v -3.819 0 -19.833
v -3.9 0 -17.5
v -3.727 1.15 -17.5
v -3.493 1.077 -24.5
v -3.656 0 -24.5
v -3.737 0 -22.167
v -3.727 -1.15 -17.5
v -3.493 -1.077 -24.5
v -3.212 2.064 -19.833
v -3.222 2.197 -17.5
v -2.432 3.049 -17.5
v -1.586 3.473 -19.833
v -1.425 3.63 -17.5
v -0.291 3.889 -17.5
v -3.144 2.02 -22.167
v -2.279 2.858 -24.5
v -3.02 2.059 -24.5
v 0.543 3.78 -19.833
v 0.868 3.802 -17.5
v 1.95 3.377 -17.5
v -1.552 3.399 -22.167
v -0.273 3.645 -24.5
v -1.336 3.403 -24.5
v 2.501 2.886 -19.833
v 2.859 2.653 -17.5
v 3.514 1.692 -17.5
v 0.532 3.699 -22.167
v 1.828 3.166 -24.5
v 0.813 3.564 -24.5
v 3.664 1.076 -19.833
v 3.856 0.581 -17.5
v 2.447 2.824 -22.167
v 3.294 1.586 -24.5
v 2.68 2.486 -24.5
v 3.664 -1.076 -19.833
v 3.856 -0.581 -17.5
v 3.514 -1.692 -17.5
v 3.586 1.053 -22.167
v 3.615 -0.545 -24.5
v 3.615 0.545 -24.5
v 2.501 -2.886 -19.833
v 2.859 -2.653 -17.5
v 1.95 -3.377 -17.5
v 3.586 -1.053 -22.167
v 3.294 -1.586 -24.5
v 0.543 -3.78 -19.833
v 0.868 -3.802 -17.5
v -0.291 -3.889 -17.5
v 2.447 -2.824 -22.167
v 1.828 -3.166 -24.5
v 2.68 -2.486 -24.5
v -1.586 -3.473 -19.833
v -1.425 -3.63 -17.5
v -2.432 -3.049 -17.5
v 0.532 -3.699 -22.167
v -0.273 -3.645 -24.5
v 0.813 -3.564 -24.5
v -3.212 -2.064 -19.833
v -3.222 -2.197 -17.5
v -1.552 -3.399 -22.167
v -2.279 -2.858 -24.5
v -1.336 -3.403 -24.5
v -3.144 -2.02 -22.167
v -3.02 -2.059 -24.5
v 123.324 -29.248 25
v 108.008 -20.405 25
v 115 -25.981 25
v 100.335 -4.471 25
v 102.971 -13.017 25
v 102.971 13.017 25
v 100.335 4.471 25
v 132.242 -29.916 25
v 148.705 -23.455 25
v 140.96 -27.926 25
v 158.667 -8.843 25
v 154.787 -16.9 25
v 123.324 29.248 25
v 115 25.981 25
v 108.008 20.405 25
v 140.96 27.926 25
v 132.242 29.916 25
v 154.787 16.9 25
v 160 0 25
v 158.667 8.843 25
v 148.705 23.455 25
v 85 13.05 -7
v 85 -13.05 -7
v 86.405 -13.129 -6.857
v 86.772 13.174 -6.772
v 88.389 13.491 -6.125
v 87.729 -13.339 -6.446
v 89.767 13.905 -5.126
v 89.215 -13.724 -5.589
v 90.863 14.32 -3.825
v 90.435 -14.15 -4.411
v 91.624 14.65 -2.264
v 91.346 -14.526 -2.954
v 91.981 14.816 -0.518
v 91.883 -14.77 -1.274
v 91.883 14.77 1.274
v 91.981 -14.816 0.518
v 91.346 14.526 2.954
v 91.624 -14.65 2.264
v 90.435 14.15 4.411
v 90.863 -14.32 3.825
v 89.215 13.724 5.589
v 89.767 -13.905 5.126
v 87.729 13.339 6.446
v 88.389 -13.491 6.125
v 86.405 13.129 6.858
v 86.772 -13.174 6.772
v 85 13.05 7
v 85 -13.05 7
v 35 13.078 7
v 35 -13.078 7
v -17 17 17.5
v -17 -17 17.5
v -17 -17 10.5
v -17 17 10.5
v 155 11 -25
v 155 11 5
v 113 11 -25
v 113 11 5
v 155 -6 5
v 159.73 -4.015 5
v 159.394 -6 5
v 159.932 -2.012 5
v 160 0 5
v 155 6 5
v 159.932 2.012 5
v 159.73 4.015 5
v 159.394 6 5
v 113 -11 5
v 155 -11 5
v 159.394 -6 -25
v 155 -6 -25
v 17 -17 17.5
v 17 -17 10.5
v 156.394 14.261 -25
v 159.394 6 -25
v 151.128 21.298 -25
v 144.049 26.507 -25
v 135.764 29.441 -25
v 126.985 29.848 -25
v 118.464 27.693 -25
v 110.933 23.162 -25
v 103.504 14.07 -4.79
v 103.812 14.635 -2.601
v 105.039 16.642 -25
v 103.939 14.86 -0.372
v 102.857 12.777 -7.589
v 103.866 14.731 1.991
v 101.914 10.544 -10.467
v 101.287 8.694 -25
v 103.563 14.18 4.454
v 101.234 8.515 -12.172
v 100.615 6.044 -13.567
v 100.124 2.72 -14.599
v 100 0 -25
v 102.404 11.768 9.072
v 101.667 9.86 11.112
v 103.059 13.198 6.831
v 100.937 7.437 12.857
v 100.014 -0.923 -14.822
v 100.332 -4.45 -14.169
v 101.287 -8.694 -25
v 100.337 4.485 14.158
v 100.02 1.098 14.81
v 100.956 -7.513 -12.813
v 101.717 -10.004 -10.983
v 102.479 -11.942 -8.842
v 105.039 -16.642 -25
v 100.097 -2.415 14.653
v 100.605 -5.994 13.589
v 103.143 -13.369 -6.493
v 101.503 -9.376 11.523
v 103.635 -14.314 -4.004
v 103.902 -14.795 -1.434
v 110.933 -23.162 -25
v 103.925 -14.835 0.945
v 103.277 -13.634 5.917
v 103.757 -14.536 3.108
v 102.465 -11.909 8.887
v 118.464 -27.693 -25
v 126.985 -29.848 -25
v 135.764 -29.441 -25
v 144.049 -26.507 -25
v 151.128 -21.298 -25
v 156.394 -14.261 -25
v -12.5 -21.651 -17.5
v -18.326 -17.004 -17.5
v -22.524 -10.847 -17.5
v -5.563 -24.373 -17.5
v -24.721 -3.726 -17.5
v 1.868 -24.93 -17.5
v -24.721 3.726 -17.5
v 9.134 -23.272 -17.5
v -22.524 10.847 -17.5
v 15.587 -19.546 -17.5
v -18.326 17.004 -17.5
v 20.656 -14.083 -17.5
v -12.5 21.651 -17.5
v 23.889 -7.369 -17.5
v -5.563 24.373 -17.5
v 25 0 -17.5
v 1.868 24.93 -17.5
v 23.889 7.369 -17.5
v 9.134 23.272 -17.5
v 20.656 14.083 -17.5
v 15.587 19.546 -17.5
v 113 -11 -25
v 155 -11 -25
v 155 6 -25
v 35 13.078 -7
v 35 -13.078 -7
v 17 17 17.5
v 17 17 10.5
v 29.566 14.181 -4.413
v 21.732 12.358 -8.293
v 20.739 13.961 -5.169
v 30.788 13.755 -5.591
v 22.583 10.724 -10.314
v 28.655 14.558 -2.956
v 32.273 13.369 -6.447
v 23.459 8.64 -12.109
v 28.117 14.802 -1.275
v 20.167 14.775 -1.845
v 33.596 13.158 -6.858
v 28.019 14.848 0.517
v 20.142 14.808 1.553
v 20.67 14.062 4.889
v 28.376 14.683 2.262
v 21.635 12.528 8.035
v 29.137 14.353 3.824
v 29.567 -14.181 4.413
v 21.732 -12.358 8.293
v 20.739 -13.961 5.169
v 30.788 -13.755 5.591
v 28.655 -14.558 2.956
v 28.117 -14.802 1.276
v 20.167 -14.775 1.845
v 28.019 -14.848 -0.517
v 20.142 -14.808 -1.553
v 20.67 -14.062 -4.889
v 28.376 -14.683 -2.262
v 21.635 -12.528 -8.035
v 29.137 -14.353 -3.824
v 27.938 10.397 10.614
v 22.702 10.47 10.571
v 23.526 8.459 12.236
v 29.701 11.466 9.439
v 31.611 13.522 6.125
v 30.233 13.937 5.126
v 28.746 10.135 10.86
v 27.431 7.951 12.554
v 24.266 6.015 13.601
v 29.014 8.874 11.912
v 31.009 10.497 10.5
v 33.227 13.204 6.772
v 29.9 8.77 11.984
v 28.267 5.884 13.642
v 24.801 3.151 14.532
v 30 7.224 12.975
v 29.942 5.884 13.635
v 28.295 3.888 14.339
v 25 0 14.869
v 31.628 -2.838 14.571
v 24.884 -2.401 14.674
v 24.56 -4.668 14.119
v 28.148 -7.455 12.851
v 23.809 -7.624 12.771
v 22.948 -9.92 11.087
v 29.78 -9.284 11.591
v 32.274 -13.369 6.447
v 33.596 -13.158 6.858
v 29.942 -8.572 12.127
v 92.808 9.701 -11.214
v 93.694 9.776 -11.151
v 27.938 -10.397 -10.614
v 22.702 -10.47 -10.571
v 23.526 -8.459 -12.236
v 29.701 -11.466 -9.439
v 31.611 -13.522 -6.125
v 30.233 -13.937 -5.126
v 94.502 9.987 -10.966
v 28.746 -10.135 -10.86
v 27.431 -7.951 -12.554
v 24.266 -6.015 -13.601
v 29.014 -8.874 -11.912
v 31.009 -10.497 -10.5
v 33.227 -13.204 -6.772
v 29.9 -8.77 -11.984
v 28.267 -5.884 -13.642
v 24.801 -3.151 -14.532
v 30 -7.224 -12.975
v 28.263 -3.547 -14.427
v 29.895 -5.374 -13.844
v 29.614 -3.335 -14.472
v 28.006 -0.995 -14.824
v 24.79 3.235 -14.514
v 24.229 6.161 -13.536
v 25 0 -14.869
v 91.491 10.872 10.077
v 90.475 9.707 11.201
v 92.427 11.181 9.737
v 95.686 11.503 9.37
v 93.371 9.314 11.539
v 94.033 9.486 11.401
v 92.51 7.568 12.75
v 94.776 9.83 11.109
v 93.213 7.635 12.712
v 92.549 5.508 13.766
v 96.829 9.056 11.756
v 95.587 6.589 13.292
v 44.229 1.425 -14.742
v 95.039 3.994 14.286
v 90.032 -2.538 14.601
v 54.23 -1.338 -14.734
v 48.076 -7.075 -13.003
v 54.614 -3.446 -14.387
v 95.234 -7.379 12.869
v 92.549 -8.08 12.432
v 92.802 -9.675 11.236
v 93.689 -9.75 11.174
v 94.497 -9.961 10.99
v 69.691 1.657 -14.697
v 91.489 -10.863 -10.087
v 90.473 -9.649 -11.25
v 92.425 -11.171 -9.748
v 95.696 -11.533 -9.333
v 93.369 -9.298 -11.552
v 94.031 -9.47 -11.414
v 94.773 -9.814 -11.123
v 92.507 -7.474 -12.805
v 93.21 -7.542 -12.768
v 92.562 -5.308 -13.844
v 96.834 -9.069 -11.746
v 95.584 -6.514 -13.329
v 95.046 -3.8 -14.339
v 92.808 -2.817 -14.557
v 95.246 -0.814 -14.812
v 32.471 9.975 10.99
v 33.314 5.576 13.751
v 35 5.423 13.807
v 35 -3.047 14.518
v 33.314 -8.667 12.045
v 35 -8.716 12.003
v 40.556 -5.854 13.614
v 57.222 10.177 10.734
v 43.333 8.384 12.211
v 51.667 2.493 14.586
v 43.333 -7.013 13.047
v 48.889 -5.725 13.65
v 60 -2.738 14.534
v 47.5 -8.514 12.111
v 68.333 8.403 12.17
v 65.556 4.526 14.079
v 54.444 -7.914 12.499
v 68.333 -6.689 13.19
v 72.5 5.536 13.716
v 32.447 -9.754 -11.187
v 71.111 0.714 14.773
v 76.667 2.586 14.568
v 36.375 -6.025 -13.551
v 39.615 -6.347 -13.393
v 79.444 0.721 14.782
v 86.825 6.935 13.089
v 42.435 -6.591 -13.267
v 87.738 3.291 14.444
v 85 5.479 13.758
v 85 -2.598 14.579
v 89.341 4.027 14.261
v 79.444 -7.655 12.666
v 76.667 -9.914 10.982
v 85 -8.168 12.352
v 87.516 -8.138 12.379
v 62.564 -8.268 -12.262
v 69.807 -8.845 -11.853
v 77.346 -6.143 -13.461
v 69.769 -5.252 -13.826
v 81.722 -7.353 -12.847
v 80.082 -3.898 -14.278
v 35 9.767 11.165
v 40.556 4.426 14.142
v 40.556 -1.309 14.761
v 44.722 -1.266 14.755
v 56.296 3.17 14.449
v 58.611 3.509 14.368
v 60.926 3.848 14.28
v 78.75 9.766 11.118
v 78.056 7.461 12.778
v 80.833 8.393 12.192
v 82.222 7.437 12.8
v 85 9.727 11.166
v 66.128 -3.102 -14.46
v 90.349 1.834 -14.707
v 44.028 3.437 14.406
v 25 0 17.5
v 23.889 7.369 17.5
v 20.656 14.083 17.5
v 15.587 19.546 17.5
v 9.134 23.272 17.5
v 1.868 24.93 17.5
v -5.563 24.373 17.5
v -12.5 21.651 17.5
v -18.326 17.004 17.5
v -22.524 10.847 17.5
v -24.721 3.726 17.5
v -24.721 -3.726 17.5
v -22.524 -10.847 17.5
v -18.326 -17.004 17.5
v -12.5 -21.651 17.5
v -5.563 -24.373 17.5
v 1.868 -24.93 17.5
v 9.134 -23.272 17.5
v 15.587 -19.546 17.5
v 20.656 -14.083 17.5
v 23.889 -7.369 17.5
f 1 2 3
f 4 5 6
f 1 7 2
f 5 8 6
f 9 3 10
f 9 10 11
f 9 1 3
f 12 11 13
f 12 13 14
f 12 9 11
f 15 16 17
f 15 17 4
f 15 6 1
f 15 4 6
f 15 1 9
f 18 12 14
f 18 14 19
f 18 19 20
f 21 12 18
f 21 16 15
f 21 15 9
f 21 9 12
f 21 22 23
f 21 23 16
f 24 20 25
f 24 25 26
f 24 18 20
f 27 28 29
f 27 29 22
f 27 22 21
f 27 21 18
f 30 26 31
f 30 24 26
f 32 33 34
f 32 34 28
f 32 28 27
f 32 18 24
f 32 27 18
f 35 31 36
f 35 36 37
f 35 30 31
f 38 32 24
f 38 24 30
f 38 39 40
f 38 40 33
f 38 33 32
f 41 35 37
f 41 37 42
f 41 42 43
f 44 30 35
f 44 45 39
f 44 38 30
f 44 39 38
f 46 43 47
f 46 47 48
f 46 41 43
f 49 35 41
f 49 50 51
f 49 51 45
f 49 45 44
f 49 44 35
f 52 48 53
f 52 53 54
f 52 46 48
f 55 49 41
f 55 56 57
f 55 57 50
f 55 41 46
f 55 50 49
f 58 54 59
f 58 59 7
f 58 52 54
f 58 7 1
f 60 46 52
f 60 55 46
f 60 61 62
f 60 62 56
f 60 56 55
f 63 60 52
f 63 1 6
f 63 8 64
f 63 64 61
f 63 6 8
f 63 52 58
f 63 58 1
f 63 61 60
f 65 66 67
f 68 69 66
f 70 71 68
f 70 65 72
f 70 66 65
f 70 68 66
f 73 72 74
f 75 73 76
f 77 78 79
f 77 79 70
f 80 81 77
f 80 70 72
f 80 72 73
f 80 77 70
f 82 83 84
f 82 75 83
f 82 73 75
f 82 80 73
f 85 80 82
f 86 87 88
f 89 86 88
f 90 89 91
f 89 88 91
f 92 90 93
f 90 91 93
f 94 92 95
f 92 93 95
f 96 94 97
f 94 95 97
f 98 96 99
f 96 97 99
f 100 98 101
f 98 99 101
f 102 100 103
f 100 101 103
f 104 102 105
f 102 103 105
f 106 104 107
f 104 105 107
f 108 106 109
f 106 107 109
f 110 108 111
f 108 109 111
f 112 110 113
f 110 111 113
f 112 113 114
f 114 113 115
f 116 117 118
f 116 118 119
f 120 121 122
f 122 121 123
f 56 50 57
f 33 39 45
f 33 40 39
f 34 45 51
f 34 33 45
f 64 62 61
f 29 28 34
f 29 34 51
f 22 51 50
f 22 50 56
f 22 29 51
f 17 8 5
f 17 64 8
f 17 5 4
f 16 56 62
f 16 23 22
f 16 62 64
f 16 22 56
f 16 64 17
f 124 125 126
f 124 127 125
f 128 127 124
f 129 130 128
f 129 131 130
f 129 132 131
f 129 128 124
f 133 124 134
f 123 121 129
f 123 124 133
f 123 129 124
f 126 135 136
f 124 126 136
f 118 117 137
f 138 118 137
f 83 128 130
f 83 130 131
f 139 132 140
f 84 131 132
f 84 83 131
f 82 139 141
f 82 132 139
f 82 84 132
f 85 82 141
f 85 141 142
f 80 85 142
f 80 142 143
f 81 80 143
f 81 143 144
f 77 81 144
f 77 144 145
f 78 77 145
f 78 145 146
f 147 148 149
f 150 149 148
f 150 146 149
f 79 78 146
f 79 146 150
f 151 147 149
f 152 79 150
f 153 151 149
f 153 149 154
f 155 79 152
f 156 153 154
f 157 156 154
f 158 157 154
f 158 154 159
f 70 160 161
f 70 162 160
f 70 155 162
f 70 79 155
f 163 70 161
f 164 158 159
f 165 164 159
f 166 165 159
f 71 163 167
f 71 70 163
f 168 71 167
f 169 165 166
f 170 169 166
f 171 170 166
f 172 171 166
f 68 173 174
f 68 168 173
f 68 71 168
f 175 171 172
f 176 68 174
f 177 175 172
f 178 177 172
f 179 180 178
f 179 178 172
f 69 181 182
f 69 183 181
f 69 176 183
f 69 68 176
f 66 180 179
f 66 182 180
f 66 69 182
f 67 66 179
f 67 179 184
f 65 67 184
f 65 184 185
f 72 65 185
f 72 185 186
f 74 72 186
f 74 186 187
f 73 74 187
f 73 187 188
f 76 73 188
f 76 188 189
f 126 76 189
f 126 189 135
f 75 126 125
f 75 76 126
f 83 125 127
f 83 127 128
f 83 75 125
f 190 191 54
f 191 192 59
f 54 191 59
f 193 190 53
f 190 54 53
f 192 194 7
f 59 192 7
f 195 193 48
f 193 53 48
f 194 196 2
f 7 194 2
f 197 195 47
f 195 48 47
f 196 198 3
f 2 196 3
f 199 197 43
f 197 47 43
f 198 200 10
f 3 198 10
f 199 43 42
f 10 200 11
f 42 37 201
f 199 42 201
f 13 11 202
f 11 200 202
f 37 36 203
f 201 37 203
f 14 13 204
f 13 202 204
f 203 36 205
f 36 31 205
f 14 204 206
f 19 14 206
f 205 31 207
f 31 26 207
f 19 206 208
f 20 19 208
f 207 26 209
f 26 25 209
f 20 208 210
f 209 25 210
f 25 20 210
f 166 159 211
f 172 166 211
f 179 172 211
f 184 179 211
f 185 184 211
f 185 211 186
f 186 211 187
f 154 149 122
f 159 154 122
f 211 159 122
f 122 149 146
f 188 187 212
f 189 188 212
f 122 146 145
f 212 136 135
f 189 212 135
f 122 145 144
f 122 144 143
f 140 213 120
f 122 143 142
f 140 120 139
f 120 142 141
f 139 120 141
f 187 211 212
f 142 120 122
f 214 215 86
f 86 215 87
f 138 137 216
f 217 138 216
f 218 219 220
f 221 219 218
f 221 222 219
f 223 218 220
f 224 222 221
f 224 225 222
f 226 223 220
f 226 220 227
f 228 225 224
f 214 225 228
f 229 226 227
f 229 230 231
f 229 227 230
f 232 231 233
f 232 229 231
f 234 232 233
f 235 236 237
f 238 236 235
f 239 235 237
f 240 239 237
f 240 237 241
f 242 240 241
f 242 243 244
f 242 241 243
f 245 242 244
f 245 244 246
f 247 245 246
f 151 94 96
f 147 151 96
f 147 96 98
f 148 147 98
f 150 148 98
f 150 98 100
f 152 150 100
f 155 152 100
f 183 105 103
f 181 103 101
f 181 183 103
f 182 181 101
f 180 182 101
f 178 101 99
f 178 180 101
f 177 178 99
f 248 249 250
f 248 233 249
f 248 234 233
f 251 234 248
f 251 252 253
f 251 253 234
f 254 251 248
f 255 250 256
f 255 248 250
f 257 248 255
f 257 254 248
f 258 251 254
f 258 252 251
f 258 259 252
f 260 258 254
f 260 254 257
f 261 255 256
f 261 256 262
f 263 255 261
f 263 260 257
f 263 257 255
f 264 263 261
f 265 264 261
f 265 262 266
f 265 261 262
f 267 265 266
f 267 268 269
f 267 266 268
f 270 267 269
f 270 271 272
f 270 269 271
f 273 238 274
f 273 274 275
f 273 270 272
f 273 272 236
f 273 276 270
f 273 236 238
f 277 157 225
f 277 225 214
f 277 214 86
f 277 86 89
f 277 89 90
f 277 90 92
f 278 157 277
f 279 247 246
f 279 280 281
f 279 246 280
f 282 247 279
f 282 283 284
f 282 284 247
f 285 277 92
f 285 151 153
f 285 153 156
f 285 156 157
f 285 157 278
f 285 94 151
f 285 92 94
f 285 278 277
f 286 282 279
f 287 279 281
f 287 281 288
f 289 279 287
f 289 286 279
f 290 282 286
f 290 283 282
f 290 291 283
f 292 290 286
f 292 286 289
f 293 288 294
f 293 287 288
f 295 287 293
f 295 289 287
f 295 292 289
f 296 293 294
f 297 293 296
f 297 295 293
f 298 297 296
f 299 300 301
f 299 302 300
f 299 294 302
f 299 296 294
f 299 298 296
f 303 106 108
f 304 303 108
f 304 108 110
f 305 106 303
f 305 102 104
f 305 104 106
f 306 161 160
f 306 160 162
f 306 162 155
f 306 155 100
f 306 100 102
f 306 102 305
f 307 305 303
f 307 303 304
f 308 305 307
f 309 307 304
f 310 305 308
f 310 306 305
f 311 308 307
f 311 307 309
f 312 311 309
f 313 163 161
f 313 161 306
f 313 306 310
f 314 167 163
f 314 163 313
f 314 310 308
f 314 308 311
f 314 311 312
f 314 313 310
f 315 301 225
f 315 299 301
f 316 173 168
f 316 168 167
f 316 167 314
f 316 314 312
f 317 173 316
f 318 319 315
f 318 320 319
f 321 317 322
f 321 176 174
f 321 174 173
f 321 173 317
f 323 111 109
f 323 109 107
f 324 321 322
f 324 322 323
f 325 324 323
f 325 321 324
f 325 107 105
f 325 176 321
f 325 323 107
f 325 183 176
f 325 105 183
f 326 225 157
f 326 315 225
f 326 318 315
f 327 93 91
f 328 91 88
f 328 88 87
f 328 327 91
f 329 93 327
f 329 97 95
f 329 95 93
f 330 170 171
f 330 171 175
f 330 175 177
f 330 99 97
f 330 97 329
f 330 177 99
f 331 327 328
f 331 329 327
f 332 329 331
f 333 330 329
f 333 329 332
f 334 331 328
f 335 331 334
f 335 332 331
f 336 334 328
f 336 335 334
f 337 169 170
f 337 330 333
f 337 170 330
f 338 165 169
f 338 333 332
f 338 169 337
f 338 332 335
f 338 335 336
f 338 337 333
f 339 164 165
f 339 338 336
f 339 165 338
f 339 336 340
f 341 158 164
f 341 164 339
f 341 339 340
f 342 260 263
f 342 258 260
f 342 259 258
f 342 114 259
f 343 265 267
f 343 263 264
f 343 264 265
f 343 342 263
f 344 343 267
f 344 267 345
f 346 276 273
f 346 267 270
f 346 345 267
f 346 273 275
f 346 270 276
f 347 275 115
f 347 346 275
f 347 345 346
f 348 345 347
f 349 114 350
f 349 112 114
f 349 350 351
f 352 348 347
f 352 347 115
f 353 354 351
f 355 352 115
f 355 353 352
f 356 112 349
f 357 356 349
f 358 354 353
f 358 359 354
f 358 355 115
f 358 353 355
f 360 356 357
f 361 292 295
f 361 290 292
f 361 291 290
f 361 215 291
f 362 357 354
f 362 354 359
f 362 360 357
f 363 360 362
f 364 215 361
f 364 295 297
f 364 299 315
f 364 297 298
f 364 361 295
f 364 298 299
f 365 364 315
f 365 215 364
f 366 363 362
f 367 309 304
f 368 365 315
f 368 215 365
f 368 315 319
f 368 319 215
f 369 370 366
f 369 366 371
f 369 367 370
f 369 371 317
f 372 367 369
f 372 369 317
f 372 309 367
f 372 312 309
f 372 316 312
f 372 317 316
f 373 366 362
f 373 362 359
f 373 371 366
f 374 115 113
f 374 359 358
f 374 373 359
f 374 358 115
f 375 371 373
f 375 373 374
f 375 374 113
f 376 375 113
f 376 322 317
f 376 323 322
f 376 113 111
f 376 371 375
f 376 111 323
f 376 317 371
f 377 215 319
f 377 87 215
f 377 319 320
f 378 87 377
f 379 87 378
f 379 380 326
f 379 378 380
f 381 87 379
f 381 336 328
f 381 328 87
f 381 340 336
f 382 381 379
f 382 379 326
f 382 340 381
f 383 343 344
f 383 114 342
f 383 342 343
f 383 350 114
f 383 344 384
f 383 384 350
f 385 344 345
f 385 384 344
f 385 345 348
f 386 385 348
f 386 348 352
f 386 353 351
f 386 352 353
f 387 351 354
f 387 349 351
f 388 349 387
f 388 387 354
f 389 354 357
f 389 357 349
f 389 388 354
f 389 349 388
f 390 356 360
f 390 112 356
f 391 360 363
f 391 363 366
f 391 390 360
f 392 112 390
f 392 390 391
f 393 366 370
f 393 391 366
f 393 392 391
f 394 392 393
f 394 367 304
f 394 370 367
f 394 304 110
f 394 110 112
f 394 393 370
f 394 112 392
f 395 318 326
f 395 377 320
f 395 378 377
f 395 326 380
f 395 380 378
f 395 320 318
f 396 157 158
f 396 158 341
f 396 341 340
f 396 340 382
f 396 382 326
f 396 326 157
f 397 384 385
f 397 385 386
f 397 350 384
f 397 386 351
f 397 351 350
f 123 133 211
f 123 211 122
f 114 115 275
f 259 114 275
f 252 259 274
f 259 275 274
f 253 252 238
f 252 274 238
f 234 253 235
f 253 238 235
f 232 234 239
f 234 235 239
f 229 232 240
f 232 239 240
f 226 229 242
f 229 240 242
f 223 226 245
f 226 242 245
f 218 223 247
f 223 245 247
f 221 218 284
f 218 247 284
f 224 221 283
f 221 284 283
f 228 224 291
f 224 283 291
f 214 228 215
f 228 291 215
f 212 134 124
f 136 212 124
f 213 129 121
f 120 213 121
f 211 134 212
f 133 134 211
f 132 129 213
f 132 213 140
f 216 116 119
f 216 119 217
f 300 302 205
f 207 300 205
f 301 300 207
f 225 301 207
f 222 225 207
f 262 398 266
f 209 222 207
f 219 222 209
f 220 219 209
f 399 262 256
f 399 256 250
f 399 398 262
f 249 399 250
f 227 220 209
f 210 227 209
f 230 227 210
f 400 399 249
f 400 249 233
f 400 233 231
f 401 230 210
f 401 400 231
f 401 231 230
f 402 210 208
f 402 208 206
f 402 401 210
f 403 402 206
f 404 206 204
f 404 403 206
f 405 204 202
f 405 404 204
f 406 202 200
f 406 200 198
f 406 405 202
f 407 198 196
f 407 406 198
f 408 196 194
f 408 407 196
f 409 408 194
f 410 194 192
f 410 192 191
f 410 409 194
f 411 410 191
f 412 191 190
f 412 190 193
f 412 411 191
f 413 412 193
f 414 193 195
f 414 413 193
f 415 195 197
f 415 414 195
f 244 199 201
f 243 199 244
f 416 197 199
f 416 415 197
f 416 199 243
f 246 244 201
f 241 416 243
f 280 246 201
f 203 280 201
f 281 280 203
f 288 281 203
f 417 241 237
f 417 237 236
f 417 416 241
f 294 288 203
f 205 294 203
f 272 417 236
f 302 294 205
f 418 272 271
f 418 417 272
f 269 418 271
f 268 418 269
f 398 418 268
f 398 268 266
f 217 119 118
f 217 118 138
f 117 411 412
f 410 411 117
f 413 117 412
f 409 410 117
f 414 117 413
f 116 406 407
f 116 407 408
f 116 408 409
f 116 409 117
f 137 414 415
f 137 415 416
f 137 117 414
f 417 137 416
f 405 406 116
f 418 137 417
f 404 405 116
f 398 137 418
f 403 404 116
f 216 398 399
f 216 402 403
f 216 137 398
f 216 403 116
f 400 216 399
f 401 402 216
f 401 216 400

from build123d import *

# Parameters (mm, degrees)
SKETCH1_R               = 25
BOSS_EXTRUDE1_DEPTH     = 17.5
SKETCH4_R               = 30
BOSS_EXTRUDE2_DEPTH     = 25
CUT_EXTRUDE1_DEPTH      = 165.696691051
CUT_EXTRUDE1_DEPTH_BACK = 165.696691051
SKETCH6_W               = 34
SKETCH6_H               = 34
CUT_EXTRUDE2_DEPTH      = 7
SKETCH7_R               = 3.9
BOSS_EXTRUDE3_DEPTH     = 7
BOSS_EXTRUDE3_TAPER     = 2
CUT_EXTRUDE3_START      = -30
SKETCH8_W               = 42
SKETCH8_H               = 22
CUT_EXTRUDE3_DEPTH      = 30


with BuildPart() as part:
    # Sketch1 → Boss-Extrude1 (new, symmetric)
    with BuildSketch(Plane.XY):
        Circle(SKETCH1_R)
    extrude(amount=BOSS_EXTRUDE1_DEPTH, both=True)

    # Loft1: read off the stored shape, not the designer's step
    # Loft1: loft between two sections, ruled curve by curve
    loft1_from = [
        Edge.make_bspline([(0, 9.43003665, -11.665093603), (0, 32.760223857, 7.194979697), (0, 13.900150557, 30.525166904), (0, -9.43003665, 11.665093603), (0, -32.760223857, -7.194979697), (0, -13.900150557, -30.525166904), (0, 9.43003665, -11.665093603)], [0, 0, 0, 0, 0.5, 0.5, 0.5, 1, 1, 1, 1], 3, [1, 0.333333333, 0.333333333, 1, 0.333333333, 0.333333333, 1]),
    ]
    loft1_to = [
        Edge.make_bspline([(130, 5.054457016, -14.122764045), (130, 33.299985106, -4.013850014), (130, 23.191071075, 24.231678077), (130, -5.054457016, 14.122764045), (130, -33.299985106, 4.013850014), (130, -23.191071075, -24.231678077), (130, 5.054457016, -14.122764045)], [0, 0, 0, 0, 0.5, 0.5, 0.5, 1, 1, 1, 1], 3, [1, 0.333333333, 0.333333333, 1, 0.333333333, 0.333333333, 1]),
    ]
    loft1 = Solid(Shell([*[Face.make_surface_from_curves(loft1_from[k], loft1_to[k]) for k in range(1)], Face(Wire(loft1_from)), Face(Wire(loft1_to))]))
    add(loft1)

    # Sketch4 → Boss-Extrude2 (add, symmetric)
    with BuildSketch(Plane.XY):
        with Locations((130, 0)):
            Circle(SKETCH4_R)
    extrude(amount=BOSS_EXTRUDE2_DEPTH, both=True)

    # Sketch5 → Cut-Extrude1 (cut, two sides: drawn at the far end of the back side and taken through both)
    with BuildSketch(Plane(origin=(0, 0, 0), x_dir=(1, 0, 0), z_dir=(0, 1, 0)).offset(-CUT_EXTRUDE1_DEPTH_BACK)):
        with BuildLine():
            Line((35, 7), (85, 7))
            ThreePointArc((85, 7), (92, 0), (85, -7))
            Line((85, -7), (35, -7))
            ThreePointArc((35, -7), (28, 0), (35, 7))
        make_face()
    extrude(amount=CUT_EXTRUDE1_DEPTH + CUT_EXTRUDE1_DEPTH_BACK, mode=Mode.SUBTRACT)

    # Sketch6 → Cut-Extrude2 (cut)
    with BuildSketch(Plane.XY.offset(17.5)):
        Rectangle(SKETCH6_W, SKETCH6_H)
    extrude(amount=-CUT_EXTRUDE2_DEPTH, mode=Mode.SUBTRACT)

    # Sketch7 → Boss-Extrude3 (add)
    with BuildSketch(Plane(origin=(0, 0, -17.5), x_dir=(-1, 0, 0), z_dir=(0, 0, -1))):
        Circle(SKETCH7_R)
    extrude(amount=BOSS_EXTRUDE3_DEPTH, taper=BOSS_EXTRUDE3_TAPER)

    # Sketch8 → Cut-Extrude3 (cut)
    with BuildSketch(Plane(origin=(0, 0, -25), x_dir=(-1, 0, 0), z_dir=(0, 0, -1)).offset(CUT_EXTRUDE3_START)):
        with Locations((-134, 0)):
            Rectangle(SKETCH8_W, SKETCH8_H)
        with BuildLine():
            Line((-165, -6), (-159.393876913, -6))
            ThreePointArc((-159.393876913, -6), (-160, 0), (-159.393876913, 6))
            Line((-159.393876913, 6), (-165, 6))
            Line((-165, 6), (-165, -6))
        make_face()
        with BuildLine():
            Line((-159.393876913, -6), (-155, -6))
            Line((-155, -6), (-155, 6))
            Line((-155, 6), (-159.393876913, 6))
            ThreePointArc((-159.393876913, 6), (-160, 0), (-159.393876913, -6))
        make_face()
    extrude(amount=CUT_EXTRUDE3_DEPTH, mode=Mode.SUBTRACT)


solid = part.part
